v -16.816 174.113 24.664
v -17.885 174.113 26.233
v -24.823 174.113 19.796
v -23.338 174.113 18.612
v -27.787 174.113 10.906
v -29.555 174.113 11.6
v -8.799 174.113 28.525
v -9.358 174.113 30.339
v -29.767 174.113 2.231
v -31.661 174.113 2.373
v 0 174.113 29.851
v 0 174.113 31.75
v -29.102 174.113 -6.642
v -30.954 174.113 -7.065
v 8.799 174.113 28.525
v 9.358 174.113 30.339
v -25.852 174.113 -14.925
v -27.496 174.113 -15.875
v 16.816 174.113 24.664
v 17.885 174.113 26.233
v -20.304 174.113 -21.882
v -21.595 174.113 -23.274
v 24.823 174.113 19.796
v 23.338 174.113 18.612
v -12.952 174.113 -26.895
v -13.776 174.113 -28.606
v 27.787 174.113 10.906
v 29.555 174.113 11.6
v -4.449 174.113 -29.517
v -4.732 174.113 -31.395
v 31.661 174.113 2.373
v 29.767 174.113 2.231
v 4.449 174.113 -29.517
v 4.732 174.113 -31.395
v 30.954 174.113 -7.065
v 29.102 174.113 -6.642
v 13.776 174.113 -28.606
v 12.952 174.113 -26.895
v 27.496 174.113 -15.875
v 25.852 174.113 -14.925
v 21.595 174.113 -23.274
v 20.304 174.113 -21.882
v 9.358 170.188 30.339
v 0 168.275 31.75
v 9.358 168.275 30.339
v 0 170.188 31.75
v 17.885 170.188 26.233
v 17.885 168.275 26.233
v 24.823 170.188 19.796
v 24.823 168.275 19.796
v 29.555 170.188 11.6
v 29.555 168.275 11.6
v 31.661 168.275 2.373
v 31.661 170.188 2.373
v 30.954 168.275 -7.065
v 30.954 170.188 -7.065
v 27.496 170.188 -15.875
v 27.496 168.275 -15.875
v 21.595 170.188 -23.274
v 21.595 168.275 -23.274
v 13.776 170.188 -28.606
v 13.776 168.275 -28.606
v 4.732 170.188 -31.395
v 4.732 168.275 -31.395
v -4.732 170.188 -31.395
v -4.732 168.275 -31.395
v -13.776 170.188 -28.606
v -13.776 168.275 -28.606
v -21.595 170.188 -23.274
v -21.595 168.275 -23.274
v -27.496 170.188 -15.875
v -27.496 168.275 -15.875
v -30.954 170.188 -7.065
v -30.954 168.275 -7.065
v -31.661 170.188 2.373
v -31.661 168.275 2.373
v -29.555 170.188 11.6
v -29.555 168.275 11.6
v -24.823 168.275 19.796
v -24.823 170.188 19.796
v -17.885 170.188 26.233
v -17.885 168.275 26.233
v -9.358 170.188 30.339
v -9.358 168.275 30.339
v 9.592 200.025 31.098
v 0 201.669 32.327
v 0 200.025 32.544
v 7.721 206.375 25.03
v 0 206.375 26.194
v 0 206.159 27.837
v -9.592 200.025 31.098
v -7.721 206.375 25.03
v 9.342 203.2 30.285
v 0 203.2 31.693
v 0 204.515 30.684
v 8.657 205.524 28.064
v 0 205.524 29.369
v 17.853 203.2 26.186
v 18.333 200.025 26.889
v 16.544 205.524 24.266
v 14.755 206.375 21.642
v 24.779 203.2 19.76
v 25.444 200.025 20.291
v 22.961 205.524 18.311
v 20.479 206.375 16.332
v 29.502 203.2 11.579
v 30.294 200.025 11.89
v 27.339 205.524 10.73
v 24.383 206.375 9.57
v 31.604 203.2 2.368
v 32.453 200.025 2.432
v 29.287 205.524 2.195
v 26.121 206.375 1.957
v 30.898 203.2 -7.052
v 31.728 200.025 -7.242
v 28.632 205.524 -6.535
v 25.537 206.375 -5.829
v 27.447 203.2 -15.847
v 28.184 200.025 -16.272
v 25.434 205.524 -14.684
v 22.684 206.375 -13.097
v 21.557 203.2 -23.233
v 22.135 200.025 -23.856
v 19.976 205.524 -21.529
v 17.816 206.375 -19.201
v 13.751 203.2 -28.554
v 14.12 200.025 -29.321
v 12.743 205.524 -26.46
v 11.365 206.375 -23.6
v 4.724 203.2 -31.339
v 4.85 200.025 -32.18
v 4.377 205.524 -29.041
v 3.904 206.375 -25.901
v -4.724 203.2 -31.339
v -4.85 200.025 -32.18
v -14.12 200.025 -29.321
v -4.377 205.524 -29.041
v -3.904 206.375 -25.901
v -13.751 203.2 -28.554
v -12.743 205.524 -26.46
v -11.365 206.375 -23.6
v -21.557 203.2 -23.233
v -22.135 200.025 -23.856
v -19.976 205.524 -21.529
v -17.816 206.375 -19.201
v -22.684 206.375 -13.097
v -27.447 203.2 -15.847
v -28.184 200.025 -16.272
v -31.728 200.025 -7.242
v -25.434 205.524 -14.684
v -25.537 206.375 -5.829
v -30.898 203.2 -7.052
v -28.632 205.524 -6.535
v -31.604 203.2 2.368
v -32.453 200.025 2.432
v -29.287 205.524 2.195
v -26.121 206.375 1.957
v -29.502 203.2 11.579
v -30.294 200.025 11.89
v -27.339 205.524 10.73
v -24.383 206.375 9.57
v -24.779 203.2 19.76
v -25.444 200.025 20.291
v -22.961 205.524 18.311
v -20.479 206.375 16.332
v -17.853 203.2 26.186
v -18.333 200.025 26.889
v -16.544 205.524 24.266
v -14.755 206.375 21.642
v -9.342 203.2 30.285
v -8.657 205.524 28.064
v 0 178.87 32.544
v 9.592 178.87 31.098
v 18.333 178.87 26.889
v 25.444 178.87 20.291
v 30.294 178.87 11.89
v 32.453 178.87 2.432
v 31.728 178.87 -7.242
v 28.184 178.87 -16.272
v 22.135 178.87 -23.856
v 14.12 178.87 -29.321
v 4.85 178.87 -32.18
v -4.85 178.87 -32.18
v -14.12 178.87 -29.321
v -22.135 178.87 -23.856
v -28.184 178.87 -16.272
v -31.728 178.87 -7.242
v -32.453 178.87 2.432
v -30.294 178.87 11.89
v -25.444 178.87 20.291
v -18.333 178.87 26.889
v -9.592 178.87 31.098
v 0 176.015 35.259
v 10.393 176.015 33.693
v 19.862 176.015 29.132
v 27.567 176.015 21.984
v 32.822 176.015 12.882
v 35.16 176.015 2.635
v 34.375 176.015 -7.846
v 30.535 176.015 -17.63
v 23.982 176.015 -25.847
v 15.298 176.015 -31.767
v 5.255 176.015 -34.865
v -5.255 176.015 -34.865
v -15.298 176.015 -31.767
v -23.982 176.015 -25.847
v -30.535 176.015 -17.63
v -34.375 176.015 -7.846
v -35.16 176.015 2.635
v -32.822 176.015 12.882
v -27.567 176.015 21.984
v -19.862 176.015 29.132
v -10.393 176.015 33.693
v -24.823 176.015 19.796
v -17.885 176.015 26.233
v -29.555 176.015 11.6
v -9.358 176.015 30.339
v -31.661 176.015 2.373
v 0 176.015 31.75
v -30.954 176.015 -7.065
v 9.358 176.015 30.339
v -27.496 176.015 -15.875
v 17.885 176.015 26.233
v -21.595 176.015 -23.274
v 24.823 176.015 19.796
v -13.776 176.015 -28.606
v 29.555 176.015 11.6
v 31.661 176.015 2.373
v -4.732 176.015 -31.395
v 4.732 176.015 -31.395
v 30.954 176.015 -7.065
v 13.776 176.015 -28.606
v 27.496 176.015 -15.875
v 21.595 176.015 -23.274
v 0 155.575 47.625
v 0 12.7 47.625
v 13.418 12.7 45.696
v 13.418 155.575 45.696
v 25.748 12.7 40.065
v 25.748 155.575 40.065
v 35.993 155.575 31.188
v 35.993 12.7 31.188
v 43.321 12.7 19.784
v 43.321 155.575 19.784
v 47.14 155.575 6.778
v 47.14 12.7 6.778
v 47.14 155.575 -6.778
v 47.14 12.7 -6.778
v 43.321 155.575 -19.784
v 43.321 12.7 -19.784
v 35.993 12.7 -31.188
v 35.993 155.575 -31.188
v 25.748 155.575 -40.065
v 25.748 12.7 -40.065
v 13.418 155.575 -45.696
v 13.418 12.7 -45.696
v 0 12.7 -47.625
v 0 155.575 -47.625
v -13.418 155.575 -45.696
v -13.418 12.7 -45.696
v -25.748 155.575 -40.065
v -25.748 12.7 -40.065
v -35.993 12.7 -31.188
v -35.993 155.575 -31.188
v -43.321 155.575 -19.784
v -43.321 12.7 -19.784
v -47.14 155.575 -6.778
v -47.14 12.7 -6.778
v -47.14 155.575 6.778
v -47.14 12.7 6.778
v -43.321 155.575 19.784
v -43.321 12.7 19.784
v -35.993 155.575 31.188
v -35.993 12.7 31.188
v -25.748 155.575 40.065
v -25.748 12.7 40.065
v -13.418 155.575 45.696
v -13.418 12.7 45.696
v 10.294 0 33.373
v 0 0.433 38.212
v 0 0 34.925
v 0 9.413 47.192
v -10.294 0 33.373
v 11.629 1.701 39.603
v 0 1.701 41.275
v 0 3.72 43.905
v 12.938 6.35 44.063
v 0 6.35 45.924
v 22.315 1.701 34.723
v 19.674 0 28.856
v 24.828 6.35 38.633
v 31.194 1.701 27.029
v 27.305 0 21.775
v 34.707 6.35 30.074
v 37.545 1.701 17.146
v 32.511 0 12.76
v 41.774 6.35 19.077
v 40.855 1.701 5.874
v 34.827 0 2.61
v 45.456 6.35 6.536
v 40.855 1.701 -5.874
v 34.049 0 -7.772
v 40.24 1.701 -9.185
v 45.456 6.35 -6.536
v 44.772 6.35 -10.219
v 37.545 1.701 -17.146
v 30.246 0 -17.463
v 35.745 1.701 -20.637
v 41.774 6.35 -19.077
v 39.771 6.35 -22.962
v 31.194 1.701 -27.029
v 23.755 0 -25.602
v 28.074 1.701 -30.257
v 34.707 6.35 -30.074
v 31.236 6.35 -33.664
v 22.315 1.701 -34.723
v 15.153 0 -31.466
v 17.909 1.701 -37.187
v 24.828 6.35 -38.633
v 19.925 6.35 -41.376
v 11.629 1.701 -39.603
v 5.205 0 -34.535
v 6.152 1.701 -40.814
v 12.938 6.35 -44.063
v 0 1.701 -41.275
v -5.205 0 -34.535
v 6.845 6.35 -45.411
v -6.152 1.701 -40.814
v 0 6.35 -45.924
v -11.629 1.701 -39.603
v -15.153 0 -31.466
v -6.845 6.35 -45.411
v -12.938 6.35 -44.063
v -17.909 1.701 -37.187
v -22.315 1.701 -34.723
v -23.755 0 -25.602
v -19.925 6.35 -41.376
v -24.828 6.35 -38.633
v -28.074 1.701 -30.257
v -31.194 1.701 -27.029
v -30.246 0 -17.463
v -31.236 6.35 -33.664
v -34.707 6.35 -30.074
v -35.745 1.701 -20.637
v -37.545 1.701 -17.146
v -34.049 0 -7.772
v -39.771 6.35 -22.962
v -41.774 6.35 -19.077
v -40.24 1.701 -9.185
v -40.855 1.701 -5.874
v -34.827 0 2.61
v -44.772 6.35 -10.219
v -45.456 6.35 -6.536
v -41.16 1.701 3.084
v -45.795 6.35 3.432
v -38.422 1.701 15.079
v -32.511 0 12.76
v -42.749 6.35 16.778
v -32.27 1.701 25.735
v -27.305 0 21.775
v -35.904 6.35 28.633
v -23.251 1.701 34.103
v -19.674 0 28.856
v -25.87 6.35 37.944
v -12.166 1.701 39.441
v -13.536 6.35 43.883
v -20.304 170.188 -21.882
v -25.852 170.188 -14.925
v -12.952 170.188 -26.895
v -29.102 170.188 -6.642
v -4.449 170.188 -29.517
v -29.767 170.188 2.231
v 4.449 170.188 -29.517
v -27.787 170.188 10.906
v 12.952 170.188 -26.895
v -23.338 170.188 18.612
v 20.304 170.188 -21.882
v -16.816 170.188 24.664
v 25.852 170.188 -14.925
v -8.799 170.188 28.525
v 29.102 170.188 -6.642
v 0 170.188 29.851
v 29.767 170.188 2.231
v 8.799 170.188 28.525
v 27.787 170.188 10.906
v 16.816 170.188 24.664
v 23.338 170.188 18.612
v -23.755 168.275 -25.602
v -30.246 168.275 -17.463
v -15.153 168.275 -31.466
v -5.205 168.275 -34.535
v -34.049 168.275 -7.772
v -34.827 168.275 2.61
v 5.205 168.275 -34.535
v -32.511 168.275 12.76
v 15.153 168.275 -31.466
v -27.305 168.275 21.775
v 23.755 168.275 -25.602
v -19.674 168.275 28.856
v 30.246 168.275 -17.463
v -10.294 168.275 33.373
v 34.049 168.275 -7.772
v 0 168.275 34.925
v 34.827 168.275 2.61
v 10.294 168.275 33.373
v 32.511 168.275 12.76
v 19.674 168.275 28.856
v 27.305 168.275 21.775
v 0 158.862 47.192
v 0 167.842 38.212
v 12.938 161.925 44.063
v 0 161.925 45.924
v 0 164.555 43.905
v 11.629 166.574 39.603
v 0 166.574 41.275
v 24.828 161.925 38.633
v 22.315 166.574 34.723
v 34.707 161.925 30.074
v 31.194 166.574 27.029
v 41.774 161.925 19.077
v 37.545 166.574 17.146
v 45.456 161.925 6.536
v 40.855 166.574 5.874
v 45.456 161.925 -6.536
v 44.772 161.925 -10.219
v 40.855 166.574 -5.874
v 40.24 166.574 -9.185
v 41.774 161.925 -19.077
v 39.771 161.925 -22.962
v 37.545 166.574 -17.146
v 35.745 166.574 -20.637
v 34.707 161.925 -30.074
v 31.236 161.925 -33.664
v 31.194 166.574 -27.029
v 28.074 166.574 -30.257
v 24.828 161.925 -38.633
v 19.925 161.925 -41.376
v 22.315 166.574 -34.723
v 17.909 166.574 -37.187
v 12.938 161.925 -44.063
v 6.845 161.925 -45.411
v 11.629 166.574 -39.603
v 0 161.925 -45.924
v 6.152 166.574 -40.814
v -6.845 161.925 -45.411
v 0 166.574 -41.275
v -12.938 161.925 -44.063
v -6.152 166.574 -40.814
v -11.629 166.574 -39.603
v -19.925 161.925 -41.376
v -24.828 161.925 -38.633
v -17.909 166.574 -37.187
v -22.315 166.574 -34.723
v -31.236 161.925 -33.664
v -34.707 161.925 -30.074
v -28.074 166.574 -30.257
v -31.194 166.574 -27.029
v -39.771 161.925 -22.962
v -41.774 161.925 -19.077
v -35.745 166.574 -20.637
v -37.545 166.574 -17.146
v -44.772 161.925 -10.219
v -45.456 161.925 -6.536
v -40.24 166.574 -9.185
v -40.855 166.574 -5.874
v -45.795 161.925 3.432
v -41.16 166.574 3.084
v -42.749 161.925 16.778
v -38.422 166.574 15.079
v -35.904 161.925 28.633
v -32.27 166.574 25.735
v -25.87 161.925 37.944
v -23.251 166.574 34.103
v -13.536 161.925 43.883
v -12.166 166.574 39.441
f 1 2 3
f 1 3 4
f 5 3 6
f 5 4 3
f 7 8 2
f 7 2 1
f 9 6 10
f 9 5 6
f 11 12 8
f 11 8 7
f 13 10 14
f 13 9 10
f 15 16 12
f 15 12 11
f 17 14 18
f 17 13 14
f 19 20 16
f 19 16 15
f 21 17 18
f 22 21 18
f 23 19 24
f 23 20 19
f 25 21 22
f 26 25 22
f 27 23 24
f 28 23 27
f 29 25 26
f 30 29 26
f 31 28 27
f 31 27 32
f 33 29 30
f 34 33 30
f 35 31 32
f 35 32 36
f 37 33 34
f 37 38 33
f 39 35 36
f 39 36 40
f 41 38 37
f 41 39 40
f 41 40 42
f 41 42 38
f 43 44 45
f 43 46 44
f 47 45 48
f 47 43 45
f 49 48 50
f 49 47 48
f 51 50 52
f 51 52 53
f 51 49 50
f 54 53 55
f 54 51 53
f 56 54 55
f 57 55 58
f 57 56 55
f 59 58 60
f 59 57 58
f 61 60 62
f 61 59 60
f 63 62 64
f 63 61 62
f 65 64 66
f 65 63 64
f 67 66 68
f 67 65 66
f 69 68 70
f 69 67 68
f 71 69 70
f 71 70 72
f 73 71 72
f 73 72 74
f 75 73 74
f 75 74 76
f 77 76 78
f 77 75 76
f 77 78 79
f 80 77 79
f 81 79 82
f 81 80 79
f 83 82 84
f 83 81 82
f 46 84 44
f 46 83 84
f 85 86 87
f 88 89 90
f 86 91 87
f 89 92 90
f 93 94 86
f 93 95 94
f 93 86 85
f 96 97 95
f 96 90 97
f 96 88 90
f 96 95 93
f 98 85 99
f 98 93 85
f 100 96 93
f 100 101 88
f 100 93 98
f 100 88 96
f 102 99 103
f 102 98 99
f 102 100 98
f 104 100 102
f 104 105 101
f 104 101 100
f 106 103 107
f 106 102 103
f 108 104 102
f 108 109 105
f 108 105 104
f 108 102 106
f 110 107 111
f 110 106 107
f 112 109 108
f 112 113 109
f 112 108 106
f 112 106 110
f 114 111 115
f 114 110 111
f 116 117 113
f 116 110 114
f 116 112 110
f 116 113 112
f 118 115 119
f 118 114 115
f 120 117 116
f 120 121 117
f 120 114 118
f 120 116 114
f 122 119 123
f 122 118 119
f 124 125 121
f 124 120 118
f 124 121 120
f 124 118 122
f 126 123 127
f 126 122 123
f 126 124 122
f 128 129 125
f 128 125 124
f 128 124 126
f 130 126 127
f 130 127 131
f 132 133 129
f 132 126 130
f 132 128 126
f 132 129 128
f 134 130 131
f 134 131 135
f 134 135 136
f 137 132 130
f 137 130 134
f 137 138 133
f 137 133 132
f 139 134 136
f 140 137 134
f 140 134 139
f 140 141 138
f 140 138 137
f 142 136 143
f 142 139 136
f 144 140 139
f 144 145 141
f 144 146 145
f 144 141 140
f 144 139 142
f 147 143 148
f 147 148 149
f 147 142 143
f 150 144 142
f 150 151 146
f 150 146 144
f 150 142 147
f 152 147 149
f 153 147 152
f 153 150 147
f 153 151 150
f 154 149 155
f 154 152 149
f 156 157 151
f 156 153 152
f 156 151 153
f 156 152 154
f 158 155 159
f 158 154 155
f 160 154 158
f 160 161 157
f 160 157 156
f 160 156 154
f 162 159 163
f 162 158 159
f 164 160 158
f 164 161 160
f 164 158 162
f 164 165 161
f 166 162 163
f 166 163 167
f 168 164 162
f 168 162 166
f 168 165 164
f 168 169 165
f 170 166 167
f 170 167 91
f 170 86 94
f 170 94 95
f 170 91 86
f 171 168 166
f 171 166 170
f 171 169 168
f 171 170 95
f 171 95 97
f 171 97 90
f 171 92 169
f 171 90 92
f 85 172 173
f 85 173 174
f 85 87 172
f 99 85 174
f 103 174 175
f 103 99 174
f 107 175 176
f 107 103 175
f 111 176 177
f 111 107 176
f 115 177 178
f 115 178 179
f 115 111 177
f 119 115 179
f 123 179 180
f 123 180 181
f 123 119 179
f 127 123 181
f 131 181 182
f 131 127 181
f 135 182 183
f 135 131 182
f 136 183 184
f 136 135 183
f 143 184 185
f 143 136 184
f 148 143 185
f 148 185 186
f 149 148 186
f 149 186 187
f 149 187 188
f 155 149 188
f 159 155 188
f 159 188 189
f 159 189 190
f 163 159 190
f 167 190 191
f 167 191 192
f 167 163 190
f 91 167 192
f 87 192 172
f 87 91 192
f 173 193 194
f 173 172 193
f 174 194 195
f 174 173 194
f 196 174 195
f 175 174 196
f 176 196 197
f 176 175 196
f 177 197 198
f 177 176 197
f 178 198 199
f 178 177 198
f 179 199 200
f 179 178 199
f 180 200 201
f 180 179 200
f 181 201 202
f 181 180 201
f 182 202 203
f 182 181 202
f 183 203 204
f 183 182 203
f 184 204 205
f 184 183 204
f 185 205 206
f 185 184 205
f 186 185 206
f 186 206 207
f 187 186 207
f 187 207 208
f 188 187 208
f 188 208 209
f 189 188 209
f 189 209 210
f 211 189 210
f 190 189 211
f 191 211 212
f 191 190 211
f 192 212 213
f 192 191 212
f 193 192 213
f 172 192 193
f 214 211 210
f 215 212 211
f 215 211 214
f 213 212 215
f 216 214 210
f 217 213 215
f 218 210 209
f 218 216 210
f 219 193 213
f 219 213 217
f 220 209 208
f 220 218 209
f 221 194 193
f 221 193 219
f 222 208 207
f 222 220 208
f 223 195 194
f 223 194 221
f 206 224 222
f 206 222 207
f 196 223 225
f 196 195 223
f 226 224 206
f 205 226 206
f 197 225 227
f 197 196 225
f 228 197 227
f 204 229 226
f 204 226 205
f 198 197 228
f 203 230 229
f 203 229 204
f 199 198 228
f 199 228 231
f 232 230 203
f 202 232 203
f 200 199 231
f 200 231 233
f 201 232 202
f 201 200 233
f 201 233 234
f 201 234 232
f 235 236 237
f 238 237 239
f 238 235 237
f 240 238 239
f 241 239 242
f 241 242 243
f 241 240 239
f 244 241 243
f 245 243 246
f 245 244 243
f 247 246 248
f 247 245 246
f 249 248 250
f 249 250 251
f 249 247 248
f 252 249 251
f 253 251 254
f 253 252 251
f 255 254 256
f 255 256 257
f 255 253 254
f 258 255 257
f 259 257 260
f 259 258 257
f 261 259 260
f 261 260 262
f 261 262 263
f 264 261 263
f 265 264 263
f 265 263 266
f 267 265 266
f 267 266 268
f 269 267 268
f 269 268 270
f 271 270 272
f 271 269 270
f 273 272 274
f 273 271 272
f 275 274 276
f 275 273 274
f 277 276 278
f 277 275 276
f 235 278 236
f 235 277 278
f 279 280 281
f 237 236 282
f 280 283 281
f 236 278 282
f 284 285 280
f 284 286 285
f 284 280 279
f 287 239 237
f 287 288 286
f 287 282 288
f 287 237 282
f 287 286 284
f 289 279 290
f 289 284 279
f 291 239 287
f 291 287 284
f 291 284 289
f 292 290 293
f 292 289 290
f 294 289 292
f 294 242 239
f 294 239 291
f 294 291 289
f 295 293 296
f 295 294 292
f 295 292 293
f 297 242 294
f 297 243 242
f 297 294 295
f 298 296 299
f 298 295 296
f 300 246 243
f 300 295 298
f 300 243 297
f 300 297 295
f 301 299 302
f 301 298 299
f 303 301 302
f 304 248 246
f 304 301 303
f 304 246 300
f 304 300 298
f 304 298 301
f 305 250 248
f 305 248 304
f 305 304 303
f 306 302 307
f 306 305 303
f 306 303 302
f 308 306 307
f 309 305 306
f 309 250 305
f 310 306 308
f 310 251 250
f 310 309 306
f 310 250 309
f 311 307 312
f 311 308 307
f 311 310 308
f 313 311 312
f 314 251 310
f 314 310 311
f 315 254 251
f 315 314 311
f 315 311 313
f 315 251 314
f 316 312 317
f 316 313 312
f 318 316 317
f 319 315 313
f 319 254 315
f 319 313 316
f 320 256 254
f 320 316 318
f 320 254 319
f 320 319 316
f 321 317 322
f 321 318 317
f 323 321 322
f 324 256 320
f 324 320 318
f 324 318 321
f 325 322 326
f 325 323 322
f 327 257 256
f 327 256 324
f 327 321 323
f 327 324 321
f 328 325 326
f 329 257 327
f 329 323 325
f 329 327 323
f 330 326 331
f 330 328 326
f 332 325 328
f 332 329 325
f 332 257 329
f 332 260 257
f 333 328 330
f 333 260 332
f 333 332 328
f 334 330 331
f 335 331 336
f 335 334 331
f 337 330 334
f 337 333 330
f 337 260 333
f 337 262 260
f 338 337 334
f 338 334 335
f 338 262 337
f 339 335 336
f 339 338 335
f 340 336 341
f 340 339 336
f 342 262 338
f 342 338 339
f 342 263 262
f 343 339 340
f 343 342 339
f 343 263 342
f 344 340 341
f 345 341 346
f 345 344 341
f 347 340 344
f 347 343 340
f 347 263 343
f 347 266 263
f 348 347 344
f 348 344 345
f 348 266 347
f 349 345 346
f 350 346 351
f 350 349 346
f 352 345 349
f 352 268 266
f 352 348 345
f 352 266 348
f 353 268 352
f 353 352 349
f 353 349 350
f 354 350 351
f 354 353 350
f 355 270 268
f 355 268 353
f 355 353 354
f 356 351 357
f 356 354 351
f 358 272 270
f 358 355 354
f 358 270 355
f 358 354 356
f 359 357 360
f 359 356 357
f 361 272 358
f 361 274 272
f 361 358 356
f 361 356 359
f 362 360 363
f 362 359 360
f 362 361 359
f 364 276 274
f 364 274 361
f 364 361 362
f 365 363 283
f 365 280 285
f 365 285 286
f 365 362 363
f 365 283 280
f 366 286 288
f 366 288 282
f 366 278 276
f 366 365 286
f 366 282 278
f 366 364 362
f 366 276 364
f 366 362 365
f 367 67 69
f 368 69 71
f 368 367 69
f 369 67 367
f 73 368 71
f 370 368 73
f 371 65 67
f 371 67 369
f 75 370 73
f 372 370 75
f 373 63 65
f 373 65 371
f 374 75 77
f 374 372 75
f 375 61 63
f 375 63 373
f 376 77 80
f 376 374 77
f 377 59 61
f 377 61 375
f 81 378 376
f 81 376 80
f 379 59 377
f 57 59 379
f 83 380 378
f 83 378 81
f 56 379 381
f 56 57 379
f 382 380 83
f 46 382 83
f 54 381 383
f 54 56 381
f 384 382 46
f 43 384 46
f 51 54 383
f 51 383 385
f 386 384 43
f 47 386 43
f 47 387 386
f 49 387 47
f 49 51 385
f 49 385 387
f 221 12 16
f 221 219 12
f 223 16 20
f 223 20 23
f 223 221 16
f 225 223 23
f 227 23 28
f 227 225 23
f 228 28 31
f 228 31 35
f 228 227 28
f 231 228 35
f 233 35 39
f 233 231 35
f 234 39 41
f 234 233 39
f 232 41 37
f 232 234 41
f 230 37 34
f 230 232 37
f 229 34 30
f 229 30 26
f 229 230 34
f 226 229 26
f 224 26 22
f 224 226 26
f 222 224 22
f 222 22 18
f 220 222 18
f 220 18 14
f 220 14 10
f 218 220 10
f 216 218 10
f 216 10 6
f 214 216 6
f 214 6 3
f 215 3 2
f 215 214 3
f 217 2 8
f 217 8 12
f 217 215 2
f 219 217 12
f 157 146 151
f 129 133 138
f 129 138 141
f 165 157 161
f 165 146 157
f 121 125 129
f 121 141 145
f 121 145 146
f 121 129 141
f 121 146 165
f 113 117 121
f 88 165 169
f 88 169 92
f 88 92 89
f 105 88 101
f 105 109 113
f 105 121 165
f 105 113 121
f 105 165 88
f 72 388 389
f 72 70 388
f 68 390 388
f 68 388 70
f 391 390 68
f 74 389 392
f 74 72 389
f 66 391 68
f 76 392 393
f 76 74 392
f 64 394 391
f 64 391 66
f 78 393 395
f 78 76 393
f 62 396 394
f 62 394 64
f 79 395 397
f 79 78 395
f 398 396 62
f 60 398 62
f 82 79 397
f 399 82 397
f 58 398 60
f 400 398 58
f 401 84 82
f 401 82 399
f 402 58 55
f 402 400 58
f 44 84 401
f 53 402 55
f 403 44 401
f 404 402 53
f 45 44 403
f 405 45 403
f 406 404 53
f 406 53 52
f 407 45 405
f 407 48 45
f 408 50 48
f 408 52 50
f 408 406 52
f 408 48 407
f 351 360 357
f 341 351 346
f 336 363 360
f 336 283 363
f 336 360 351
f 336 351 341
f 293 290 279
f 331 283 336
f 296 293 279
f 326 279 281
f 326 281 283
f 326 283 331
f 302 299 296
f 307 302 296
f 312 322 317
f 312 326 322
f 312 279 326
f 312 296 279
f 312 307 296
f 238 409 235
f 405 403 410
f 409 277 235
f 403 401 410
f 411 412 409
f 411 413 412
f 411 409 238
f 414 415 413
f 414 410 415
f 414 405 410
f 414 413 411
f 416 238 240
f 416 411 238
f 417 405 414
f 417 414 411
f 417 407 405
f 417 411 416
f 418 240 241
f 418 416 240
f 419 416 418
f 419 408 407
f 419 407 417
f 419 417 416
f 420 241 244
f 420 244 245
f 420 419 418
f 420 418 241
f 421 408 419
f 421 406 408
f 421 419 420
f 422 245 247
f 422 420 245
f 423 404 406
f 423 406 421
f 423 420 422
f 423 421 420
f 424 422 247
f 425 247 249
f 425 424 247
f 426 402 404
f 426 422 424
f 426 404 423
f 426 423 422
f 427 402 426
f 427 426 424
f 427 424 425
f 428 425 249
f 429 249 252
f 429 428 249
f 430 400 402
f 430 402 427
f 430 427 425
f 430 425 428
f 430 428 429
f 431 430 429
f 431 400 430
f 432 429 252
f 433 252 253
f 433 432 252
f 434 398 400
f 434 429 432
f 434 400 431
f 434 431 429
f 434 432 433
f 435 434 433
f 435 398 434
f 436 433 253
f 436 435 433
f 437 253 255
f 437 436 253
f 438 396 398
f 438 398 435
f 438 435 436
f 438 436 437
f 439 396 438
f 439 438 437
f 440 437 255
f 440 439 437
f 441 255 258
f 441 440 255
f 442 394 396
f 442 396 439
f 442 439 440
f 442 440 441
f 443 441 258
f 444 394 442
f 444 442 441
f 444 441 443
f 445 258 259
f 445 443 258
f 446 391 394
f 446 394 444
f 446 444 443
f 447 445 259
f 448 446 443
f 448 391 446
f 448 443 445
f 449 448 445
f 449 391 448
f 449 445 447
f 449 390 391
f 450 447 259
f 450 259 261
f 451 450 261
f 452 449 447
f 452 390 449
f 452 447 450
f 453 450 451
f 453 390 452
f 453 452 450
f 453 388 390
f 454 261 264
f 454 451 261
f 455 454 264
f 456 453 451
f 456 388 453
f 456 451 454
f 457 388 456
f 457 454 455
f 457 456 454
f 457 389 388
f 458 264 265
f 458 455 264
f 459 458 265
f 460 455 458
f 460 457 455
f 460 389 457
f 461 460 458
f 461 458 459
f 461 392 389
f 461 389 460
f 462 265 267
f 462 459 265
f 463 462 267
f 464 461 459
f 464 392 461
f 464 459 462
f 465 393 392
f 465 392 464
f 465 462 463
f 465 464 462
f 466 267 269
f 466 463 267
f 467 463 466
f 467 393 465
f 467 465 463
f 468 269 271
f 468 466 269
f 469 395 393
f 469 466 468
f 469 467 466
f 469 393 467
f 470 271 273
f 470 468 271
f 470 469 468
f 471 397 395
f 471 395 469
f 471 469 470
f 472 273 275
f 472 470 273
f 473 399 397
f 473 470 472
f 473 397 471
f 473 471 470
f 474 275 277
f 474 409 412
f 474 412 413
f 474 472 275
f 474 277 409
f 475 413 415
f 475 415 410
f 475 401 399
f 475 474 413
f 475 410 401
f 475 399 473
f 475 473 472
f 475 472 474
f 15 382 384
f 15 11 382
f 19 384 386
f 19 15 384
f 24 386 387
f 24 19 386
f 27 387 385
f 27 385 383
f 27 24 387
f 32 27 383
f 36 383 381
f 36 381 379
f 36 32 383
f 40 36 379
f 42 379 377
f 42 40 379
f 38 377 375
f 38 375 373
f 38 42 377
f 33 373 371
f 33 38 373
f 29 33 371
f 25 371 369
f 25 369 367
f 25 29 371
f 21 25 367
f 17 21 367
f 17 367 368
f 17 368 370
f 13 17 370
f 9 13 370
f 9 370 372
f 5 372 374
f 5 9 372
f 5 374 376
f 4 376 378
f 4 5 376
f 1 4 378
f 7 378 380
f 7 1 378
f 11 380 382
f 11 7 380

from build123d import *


with BuildPart() as part:
    # Sketch4 → Revolve1 (revolve)
    with BuildSketch(Plane(origin=(0, 0, 0), x_dir=(0, 0, -1), z_dir=(1, 0, 0))):
        with BuildLine():
            Line((0, 0), (-34.925, 0))
            ThreePointArc((-34.925, 0), (-43.905256121, 3.719743879), (-47.625, 12.7))
            Line((-47.625, 12.7), (-47.625, 155.575))
            ThreePointArc((-47.625, 155.575), (-43.905256121, 164.555256121), (-34.925, 168.275))
            Line((-34.925, 168.275), (-31.75, 168.275))
            Line((-31.75, 168.275), (-31.75, 170.188405715))
            Line((-31.75, 170.188405715), (-29.850831966, 170.188405715))
            Line((-29.850831966, 170.188405715), (-29.850831966, 174.113488189))
            Line((-29.850831966, 174.113488189), (-31.75, 174.113488189))
            Line((-31.75, 174.113488189), (-31.75, 176.015383727))
            Line((-31.75, 176.015383727), (-35.259086236, 176.015383727))
            Line((-35.259086236, 176.015383727), (-32.54375, 178.87031185))
            Line((-32.54375, 178.87031185), (-32.54375, 200.025))
            ThreePointArc((-32.54375, 200.025), (-30.683878061, 204.515128061), (-26.19375, 206.375))
            Line((-26.19375, 206.375), (0, 206.375))
            Line((0, 206.375), (0, 0))
        make_face()
    revolve(axis=Axis((0, -30.534688995, 0), (0, 1, 0)))


solid = part.part
